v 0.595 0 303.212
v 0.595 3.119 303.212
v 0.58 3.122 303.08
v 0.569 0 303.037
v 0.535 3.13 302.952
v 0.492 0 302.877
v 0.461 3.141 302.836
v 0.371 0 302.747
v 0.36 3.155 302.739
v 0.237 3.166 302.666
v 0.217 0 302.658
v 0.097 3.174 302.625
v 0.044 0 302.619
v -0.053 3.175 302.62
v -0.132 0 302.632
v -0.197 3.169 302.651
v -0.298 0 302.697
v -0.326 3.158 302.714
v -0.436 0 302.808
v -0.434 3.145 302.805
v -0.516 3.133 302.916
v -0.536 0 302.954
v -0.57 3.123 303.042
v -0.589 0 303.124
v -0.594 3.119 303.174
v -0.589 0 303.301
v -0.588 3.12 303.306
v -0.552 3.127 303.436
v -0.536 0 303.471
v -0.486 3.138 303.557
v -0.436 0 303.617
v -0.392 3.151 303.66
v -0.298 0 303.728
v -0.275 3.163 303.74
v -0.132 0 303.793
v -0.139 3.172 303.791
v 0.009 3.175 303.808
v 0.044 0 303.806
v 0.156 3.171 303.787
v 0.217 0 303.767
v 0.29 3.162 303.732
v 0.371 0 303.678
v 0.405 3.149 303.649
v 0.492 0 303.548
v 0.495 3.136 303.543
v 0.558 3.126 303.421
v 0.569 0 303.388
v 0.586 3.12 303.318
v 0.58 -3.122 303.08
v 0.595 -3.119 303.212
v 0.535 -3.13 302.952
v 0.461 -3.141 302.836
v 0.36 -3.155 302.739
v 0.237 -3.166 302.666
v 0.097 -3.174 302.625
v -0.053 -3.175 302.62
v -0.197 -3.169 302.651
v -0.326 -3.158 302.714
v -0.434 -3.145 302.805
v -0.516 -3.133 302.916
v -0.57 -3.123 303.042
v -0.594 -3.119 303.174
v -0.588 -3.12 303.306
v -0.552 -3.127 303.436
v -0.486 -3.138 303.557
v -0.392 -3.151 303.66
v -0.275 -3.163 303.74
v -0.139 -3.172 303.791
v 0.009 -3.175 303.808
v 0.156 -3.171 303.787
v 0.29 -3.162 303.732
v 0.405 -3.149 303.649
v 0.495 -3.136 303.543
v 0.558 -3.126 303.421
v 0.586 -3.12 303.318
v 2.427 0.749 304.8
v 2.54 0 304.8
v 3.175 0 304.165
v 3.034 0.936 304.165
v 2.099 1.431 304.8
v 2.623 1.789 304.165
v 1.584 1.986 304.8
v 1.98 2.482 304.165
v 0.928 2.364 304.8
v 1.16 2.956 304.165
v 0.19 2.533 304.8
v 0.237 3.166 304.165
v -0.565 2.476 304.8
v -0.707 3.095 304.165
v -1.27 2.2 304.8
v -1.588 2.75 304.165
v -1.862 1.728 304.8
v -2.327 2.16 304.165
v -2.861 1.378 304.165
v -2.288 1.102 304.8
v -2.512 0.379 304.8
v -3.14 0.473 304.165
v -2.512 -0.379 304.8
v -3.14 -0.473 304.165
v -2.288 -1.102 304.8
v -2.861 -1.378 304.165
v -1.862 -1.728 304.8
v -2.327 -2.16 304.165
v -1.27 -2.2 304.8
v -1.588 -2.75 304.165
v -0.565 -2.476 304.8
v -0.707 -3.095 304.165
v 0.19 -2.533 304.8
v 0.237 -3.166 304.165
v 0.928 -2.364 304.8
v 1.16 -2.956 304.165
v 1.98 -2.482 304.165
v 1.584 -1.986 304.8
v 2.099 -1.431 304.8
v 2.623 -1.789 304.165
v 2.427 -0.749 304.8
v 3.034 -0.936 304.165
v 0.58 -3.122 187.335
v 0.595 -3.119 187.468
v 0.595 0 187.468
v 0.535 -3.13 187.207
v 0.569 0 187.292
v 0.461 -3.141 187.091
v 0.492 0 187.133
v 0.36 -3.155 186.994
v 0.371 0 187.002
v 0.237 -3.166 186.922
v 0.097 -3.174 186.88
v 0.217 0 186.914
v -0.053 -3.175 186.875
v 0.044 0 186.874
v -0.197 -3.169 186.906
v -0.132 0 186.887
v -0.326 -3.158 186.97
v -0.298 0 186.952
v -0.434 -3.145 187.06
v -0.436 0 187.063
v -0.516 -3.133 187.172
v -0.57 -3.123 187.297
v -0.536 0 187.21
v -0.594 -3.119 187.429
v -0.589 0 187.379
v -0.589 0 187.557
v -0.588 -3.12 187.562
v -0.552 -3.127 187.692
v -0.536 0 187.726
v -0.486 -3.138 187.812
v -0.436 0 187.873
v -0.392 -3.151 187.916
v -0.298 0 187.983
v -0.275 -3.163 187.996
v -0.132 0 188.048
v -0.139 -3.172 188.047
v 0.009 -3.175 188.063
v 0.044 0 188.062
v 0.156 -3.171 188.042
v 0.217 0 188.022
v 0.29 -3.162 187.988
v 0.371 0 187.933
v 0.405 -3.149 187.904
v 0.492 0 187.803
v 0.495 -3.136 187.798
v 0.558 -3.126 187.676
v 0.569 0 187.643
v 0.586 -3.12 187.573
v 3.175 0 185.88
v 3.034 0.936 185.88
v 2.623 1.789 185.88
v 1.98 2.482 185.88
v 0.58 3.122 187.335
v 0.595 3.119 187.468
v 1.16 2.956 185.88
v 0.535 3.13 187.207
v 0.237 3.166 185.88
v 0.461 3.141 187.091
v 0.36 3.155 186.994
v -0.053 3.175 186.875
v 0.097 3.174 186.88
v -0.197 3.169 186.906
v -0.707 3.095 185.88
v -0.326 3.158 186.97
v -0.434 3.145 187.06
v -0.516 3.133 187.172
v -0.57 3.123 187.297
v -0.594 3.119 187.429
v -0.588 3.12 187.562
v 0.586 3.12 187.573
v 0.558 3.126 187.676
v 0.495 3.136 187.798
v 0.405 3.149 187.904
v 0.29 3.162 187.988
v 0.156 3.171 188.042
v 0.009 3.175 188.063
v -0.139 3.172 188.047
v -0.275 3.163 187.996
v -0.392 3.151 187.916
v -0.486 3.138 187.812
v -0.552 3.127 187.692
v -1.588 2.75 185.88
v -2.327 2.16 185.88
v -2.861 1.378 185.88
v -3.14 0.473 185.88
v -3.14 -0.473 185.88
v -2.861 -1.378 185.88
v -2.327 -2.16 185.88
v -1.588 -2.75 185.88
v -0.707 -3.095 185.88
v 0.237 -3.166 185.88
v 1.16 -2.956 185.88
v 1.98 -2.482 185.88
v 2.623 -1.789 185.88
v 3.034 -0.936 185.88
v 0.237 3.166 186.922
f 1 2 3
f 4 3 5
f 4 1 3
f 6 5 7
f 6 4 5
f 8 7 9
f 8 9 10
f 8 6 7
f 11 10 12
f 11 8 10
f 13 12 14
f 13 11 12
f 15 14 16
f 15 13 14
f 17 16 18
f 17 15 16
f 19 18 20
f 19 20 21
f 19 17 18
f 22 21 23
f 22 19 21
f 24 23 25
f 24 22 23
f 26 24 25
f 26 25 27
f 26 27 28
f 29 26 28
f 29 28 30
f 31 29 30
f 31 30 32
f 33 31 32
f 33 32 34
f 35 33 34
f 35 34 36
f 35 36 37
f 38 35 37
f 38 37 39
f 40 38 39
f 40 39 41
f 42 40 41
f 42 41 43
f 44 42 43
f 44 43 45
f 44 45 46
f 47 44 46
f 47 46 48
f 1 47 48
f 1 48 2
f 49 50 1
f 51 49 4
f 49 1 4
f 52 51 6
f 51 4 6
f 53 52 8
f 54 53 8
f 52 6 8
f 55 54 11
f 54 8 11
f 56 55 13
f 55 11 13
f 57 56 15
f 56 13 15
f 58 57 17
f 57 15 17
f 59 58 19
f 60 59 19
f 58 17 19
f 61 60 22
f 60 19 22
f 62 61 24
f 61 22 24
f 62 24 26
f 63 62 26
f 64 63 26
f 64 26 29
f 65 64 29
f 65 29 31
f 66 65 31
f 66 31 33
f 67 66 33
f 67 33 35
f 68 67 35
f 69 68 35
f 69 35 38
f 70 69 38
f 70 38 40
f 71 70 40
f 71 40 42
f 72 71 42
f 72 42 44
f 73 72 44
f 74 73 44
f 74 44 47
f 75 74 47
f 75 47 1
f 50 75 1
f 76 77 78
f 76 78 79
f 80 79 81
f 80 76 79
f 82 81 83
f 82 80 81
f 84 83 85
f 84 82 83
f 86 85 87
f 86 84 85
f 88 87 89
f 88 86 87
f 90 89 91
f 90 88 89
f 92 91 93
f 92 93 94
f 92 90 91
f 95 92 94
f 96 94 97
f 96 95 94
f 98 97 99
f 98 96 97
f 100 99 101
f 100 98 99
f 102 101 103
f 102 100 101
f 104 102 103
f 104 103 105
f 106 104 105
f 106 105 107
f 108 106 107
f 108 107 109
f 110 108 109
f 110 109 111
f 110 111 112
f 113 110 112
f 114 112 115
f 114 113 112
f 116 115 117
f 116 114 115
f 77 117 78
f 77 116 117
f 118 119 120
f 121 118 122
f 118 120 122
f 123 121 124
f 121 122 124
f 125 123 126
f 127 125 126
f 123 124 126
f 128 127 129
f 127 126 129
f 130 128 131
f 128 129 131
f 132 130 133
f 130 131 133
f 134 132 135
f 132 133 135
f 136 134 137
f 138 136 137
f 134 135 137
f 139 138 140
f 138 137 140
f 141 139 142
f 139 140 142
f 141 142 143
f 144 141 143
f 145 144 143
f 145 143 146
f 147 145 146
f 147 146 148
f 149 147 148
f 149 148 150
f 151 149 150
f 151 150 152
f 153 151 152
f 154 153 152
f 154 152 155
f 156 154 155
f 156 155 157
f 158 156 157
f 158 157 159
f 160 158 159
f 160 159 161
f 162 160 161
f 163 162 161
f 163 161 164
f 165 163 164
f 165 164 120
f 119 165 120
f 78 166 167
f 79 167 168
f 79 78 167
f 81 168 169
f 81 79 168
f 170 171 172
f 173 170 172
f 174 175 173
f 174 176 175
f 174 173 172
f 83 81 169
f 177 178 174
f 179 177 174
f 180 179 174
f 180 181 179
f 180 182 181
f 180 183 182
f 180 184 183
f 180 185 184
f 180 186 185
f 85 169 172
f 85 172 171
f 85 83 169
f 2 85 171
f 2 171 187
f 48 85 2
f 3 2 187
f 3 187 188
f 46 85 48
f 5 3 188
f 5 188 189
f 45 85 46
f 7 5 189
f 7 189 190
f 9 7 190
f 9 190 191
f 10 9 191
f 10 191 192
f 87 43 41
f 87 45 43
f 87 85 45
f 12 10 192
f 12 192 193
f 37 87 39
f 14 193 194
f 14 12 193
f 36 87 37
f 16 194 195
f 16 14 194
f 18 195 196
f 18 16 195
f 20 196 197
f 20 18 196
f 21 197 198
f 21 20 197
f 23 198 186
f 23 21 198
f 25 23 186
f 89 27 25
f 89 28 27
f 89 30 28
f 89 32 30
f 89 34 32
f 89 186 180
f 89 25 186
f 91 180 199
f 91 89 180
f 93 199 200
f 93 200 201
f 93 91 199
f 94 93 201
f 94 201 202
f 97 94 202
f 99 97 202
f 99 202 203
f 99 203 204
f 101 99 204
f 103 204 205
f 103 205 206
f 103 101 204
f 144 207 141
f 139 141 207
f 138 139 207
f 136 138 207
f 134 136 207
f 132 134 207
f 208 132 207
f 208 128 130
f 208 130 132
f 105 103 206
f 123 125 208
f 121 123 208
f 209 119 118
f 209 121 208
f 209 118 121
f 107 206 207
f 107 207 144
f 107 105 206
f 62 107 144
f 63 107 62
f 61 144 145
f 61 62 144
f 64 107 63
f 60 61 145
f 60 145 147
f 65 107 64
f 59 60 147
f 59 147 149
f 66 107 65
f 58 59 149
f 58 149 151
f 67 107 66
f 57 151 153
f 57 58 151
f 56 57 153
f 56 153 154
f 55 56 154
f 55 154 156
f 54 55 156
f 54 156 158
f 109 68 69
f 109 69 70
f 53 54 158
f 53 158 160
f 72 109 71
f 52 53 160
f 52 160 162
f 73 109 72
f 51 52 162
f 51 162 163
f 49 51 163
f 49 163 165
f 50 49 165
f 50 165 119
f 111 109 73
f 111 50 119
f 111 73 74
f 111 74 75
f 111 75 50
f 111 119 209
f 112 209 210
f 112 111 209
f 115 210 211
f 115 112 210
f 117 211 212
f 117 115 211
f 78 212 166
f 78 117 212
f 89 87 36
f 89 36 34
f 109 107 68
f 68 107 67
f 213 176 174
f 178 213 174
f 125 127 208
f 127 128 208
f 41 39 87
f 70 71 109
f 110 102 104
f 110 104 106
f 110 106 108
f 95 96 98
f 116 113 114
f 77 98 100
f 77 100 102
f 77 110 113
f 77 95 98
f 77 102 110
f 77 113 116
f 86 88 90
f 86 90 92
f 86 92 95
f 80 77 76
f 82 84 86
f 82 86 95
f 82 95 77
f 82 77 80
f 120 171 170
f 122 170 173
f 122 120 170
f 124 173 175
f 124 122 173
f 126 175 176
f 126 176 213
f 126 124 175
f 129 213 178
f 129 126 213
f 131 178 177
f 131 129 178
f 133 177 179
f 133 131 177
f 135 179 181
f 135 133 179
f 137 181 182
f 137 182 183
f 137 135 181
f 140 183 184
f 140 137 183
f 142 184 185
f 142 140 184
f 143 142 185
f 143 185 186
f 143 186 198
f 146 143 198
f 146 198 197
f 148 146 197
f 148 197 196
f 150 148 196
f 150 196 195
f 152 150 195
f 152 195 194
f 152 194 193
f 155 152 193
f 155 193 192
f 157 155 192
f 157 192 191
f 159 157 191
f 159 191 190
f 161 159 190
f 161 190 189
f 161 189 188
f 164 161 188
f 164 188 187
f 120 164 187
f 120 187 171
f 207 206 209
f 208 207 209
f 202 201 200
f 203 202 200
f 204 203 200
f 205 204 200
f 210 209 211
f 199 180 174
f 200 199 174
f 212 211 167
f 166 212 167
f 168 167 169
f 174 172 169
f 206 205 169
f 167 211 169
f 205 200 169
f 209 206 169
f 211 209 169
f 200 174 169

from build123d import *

# Parameters (mm, degrees)
SKETCH3_R               = 3.175
BOSS_EXTRUDE1_DEPTH     = 304.8
CHAMFER1_SIZE           = 0.635
CUT_EXTRUDE1_START      = -118.919625
SKETCH4_R               = 3.175
CUT_EXTRUDE1_DEPTH      = 491.680375
SKETCH5_R               = 0.5953125
CUT_EXTRUDE2_DEPTH      = 4.175
CUT_EXTRUDE2_DEPTH_BACK = 4.175


with BuildPart() as part:
    # Sketch3 → Boss-Extrude1 (new body, symmetric)
    with BuildSketch(Plane.XY):
        Circle(SKETCH3_R)
    extrude(amount=BOSS_EXTRUDE1_DEPTH, both=True)

    # Chamfer1
    chamfer1_edges = [part.edges().sort_by_distance(p)[0] for p in [
        (-3.175, 0, -304.8),
        (-3.175, 0, 304.8),
    ]]
    chamfer(chamfer1_edges, length=CHAMFER1_SIZE)

    # Sketch4 → Cut-Extrude1 (cut, through all)
    with BuildSketch(Plane.XY.offset(304.8).offset(CUT_EXTRUDE1_START)):
        Circle(SKETCH4_R)
    extrude(amount=-CUT_EXTRUDE1_DEPTH, mode=Mode.SUBTRACT)

    # Sketch5 → Cut-Extrude2 (cut, two sides)
    with BuildSketch(Plane(origin=(0, 0, 0), x_dir=(1, 0, 0), z_dir=(0, 1, 0))) as cut_extrude2_sk:
        with Locations((0, -187.467875)):
            Circle(SKETCH5_R)
        with Locations((0, -303.2125)):
            Circle(SKETCH5_R)
    extrude(amount=CUT_EXTRUDE2_DEPTH, mode=Mode.SUBTRACT)
    extrude(cut_extrude2_sk.sketch, amount=-CUT_EXTRUDE2_DEPTH_BACK, mode=Mode.SUBTRACT)


solid = part.part
